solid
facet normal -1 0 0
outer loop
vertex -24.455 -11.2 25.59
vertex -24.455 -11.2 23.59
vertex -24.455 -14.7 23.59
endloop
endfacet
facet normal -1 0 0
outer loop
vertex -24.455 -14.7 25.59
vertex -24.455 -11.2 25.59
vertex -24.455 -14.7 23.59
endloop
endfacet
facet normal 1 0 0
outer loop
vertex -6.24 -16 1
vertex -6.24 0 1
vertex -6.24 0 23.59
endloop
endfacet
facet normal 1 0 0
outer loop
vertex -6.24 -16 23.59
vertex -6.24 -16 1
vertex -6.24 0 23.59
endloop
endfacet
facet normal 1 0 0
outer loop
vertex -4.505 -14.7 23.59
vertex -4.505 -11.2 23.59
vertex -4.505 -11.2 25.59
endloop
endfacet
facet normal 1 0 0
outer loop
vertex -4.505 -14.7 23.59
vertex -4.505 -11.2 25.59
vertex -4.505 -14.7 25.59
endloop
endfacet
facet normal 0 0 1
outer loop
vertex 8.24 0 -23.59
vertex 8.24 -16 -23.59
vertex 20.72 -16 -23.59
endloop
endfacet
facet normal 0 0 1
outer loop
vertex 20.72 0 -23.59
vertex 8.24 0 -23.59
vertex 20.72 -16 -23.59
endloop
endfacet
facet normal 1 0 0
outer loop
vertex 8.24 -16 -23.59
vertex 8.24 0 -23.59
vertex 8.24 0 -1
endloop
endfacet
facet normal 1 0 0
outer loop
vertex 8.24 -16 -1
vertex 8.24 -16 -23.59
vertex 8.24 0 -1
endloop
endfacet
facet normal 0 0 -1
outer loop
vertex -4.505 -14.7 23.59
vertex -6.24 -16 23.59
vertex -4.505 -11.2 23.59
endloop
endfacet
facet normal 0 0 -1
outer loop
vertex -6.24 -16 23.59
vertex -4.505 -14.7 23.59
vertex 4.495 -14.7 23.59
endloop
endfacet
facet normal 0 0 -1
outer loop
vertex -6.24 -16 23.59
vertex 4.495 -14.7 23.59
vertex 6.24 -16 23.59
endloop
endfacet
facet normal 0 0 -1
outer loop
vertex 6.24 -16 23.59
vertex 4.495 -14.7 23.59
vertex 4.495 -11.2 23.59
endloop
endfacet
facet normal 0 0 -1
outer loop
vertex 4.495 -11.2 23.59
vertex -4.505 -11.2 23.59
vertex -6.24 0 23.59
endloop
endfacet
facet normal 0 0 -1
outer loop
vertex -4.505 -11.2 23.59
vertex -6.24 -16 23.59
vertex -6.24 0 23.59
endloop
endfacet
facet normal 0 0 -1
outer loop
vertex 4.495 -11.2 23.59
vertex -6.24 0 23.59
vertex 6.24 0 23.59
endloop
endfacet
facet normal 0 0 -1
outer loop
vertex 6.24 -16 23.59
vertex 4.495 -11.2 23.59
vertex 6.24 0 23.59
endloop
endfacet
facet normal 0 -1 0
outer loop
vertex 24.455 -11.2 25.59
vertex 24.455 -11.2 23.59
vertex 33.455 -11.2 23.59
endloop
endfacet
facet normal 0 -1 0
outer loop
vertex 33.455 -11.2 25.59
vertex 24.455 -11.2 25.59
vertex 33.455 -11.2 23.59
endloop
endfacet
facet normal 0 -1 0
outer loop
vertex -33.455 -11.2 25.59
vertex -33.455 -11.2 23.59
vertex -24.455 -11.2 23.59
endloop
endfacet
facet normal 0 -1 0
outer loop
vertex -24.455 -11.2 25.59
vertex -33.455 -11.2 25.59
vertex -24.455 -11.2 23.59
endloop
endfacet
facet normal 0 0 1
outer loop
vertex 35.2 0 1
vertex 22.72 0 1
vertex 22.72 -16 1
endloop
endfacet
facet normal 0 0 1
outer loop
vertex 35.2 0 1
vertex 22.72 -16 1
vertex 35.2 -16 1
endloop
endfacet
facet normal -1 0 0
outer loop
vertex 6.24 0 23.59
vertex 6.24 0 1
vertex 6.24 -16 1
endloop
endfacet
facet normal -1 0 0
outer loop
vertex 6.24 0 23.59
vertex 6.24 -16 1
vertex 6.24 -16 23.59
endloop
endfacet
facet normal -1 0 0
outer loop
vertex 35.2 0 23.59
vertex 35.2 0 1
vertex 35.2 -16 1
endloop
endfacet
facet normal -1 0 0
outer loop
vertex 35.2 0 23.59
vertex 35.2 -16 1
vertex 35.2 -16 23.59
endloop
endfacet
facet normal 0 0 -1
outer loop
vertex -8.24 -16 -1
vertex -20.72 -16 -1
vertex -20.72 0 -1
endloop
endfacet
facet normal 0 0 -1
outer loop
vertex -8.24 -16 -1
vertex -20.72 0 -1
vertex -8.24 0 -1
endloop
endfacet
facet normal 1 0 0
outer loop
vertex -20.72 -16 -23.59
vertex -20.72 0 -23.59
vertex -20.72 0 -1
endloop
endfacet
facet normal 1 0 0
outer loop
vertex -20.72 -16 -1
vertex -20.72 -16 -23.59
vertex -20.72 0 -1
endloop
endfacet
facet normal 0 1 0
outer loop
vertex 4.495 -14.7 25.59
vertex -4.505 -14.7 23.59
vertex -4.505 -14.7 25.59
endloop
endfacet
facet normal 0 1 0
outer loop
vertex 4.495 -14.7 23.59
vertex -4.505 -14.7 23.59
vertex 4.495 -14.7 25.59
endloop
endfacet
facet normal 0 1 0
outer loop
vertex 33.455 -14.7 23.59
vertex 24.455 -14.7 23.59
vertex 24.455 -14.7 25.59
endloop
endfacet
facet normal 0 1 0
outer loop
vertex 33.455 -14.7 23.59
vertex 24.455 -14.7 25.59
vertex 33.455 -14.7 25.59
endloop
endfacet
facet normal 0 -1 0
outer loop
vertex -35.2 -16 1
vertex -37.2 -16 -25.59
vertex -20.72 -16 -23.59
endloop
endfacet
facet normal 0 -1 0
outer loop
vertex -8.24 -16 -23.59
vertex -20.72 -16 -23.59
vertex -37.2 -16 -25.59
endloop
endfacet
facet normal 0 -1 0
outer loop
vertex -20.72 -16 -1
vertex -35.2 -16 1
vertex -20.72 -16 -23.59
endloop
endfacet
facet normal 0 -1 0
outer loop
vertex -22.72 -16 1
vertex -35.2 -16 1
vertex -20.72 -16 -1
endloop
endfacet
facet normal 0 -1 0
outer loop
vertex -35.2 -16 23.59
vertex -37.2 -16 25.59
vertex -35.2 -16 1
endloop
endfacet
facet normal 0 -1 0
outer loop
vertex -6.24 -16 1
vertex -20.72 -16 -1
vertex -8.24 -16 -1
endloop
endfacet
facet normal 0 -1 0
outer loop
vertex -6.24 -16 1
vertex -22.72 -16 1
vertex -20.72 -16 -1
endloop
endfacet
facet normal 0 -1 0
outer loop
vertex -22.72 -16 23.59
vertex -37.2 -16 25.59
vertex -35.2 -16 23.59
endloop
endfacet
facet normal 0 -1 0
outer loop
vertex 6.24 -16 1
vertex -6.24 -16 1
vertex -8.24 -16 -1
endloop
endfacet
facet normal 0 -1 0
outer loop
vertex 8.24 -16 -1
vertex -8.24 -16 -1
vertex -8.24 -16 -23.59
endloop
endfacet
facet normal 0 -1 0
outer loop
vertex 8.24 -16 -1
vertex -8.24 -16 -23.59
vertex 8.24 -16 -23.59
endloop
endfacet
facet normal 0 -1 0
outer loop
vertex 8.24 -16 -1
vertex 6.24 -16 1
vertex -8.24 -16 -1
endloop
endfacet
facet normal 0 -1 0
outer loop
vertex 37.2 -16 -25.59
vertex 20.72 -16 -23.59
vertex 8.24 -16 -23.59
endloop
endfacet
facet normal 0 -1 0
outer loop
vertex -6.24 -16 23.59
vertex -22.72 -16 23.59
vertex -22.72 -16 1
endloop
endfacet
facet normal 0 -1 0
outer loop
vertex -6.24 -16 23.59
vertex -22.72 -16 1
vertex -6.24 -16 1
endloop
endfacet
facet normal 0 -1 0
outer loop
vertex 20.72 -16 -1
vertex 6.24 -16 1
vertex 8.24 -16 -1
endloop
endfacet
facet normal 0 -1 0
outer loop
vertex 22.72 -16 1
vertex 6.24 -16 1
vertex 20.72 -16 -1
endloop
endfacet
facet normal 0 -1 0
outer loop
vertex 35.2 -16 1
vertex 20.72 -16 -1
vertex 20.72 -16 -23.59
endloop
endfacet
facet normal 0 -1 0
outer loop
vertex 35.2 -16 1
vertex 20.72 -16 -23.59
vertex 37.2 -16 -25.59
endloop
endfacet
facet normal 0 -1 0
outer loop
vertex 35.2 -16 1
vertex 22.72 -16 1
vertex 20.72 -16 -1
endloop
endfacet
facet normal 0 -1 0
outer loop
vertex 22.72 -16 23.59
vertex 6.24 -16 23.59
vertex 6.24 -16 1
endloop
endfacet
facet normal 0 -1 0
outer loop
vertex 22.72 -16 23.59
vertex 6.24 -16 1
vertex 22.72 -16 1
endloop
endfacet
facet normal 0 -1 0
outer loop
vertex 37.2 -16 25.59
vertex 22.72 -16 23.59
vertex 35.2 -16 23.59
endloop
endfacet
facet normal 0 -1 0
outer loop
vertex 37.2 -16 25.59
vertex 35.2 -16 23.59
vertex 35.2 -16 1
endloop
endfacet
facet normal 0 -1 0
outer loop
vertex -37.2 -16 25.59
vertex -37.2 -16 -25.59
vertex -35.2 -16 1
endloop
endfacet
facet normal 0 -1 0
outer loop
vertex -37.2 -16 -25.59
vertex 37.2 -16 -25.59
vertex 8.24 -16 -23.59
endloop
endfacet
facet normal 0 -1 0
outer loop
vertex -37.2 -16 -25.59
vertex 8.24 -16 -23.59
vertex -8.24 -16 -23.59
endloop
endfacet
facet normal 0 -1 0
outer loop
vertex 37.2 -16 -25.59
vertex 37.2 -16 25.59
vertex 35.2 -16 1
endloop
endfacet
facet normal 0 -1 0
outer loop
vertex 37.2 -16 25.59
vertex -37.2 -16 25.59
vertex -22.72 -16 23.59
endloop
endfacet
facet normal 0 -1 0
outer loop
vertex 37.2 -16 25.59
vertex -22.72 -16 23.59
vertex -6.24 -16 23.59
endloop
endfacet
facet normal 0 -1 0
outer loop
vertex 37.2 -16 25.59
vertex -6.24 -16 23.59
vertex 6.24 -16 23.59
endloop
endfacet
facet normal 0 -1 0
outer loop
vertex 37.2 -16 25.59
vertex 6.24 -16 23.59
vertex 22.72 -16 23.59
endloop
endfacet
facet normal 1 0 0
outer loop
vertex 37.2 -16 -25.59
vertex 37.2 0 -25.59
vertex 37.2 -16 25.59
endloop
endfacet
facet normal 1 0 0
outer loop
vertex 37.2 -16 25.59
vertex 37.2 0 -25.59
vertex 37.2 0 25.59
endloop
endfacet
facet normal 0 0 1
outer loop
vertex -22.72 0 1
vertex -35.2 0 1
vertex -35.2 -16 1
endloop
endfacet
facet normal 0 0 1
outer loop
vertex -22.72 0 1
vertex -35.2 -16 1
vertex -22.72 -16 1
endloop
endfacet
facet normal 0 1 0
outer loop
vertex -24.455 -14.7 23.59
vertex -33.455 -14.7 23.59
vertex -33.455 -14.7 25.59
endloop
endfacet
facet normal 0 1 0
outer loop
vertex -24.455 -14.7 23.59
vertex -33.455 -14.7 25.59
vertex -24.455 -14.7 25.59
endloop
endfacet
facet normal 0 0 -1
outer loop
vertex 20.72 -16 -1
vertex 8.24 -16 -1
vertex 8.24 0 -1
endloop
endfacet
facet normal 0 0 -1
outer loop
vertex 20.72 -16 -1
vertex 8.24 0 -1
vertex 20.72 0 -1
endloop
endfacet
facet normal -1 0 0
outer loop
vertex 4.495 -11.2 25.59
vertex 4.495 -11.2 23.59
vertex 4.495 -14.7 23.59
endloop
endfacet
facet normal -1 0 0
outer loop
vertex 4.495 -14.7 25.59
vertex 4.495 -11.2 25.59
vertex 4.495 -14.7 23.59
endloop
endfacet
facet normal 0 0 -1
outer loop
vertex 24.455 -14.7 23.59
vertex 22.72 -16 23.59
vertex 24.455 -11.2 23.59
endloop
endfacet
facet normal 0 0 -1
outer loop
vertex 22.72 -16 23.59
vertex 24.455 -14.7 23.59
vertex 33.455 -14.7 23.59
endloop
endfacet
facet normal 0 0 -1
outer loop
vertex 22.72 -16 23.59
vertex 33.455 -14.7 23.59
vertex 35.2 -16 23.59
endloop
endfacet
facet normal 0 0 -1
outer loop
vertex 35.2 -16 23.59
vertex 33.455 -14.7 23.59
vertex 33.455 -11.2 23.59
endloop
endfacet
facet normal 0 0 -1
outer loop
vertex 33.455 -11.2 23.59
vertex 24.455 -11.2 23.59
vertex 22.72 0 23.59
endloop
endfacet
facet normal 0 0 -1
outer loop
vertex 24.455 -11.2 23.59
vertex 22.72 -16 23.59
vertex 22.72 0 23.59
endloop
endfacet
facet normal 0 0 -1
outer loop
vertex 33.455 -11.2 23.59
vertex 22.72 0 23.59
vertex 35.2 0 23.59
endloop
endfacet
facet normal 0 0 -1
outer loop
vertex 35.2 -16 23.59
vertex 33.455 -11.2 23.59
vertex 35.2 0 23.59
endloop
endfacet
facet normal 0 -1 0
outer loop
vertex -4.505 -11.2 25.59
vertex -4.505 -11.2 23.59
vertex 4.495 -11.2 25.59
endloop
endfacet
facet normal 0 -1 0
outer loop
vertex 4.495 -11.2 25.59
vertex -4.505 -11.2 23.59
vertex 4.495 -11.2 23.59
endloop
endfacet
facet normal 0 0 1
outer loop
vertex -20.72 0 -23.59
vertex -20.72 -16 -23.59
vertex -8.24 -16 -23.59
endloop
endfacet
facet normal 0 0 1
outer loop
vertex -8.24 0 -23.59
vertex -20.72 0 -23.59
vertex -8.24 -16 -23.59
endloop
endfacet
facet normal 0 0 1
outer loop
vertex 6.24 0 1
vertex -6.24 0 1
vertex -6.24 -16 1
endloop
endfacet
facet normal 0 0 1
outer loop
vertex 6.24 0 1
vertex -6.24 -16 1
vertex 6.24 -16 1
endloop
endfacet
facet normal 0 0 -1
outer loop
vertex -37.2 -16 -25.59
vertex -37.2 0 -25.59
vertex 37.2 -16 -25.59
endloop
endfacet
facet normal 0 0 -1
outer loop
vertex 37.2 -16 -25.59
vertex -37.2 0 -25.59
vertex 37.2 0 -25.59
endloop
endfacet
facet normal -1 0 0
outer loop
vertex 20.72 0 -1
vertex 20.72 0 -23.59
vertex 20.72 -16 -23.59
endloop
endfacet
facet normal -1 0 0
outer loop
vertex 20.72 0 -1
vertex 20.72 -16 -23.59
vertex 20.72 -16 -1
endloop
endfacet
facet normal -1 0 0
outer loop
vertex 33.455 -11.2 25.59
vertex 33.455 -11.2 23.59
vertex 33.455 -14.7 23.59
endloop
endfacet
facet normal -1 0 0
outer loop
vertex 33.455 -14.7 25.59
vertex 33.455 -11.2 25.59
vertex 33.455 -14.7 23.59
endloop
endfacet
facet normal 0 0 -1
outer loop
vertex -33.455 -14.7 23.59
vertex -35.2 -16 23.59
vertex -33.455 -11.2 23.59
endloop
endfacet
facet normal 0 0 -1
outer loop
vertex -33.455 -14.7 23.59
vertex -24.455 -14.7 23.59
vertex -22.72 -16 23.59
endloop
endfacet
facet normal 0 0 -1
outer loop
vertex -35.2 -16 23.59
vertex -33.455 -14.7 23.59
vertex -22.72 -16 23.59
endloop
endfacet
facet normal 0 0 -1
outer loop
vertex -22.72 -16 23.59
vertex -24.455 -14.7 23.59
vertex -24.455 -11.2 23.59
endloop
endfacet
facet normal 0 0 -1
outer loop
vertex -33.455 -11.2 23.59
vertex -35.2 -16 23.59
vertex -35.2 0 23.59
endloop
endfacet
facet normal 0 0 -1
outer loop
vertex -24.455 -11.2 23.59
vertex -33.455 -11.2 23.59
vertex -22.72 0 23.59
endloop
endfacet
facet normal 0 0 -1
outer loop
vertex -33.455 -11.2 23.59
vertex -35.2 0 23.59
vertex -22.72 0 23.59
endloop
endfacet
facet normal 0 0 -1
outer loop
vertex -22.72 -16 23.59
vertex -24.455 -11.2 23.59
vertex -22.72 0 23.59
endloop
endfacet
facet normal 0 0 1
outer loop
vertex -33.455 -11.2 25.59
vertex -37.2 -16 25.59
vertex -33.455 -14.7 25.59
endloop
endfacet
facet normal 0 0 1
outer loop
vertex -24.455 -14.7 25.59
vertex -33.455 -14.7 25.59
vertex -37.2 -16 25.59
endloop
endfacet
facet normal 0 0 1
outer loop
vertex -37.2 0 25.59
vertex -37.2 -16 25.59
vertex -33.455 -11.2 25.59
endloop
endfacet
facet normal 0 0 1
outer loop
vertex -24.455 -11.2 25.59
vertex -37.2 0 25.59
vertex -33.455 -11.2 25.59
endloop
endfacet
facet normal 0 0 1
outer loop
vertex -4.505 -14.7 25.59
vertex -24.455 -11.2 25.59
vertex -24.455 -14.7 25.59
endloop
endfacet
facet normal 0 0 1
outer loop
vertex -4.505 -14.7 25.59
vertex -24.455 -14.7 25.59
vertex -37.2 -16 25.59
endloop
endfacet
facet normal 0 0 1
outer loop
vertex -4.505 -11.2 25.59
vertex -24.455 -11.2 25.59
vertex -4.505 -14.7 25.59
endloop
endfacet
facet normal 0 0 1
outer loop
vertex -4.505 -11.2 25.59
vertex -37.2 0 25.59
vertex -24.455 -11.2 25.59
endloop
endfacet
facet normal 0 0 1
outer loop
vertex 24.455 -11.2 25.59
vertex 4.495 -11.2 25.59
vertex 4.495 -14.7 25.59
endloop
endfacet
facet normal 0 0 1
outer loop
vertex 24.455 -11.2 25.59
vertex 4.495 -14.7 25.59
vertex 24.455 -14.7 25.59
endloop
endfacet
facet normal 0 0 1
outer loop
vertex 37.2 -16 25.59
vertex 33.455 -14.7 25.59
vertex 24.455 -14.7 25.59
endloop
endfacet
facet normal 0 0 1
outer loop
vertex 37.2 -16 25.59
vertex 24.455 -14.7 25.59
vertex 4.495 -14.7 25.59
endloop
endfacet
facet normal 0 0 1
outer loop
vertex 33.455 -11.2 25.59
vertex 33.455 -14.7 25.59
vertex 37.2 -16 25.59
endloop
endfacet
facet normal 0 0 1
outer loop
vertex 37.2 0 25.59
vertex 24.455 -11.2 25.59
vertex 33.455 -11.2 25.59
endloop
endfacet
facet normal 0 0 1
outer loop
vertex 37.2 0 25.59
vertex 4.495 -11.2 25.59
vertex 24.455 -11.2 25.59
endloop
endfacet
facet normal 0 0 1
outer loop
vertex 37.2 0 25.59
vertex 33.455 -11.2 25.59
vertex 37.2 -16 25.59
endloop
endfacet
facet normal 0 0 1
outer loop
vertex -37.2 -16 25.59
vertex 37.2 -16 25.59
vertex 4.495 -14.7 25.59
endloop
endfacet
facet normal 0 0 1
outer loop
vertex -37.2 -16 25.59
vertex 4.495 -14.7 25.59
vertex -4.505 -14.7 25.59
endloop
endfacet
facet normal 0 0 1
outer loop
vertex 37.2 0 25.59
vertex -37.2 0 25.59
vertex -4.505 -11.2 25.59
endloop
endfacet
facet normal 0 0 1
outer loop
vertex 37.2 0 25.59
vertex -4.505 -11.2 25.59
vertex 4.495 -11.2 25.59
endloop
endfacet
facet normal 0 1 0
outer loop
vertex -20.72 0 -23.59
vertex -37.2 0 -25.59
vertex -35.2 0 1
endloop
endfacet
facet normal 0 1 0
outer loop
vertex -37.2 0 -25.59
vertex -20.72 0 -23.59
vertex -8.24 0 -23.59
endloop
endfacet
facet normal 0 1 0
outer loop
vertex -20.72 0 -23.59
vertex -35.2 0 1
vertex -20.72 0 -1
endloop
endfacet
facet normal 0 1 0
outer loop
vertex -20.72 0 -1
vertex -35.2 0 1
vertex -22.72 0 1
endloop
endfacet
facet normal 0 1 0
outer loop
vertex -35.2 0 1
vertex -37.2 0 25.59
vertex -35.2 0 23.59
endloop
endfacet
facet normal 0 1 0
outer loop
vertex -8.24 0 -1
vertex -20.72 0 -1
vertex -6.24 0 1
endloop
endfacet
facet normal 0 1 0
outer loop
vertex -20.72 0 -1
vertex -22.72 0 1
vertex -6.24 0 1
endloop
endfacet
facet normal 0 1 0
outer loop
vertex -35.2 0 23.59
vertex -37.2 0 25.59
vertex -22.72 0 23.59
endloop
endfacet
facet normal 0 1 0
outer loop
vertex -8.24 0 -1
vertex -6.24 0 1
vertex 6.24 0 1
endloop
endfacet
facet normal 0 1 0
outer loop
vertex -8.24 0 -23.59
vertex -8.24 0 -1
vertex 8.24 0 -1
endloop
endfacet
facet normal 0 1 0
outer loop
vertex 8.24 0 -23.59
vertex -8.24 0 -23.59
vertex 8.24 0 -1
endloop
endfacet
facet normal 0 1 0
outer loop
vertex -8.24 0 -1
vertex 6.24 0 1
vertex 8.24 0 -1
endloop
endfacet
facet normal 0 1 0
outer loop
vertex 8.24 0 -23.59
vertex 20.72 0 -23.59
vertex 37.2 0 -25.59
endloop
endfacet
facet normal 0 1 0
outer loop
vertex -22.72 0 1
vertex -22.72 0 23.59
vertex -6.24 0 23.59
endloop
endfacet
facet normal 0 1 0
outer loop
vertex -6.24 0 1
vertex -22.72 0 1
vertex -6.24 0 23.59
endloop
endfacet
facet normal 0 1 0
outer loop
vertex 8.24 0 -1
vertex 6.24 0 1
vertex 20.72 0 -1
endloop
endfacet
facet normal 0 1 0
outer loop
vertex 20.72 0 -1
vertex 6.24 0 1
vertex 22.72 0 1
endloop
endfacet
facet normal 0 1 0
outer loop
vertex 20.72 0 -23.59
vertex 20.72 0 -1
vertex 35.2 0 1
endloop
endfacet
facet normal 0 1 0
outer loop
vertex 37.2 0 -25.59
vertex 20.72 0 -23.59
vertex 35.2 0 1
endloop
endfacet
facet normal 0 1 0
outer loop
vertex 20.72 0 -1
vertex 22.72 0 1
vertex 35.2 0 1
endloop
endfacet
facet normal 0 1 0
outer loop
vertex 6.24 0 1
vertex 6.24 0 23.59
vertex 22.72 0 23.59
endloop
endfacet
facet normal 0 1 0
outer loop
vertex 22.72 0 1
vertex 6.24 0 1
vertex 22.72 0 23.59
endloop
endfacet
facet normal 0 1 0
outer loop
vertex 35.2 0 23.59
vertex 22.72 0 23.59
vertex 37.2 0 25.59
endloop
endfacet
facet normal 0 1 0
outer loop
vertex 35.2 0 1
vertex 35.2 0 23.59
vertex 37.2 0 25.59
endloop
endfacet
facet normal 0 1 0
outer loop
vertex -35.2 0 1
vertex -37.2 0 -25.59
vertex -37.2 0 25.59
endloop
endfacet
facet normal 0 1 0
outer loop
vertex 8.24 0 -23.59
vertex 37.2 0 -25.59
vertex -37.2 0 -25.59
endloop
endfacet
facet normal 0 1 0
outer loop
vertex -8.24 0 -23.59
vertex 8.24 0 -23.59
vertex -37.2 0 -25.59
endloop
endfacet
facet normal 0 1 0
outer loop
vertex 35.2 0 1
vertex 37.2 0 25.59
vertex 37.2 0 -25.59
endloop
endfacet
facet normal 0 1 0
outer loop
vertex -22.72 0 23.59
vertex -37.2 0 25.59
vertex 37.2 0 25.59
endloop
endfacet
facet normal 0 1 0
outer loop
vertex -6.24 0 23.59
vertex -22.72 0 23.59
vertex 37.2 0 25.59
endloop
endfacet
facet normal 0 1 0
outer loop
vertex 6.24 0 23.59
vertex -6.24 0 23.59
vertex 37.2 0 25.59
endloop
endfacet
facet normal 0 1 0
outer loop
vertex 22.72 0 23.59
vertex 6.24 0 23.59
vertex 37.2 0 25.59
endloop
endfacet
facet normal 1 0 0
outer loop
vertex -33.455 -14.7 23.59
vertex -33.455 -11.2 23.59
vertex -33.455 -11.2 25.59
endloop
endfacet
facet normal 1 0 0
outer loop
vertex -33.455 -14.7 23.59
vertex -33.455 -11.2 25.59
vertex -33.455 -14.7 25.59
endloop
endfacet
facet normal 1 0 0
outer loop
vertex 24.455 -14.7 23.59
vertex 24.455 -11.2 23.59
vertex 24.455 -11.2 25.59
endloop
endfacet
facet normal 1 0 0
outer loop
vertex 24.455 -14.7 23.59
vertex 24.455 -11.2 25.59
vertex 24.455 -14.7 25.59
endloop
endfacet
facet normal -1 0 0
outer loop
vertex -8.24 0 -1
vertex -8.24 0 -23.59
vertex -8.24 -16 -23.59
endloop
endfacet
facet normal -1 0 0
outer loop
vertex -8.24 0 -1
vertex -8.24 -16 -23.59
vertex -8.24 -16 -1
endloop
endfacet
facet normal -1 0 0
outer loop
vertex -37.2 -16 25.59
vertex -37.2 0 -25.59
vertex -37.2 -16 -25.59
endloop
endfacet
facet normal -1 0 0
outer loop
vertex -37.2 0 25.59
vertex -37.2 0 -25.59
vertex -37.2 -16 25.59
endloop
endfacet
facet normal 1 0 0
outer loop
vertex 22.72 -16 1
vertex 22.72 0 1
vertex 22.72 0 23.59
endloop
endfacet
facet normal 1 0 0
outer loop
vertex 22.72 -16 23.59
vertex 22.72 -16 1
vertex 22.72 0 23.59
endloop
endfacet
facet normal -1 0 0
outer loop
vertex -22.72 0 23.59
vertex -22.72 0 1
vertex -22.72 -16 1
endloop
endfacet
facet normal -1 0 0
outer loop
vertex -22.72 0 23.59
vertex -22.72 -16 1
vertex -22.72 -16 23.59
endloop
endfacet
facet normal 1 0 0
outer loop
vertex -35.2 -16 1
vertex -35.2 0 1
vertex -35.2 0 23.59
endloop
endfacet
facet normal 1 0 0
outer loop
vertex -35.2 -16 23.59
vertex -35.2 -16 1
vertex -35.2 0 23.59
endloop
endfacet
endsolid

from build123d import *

# Parameters (mm, degrees)
F0_W     = 74.4
F0_H     = 51.18
F0_W_2   = 12.48
F0_H_2   = 22.59
F1_DEPTH = 16
F2_W     = 9
F2_H     = 3.5
F3_DEPTH = 25


with BuildPart() as f1:
    # F0 (on Front) → F1 (new body)
    with BuildSketch(Plane.XZ):
        Rectangle(F0_W, F0_H)
        with Locations((-14.48, -12.295)):
            Rectangle(F0_W_2, F0_H_2, mode=Mode.SUBTRACT)
        with Locations((14.48, -12.295)):
            Rectangle(F0_W_2, F0_H_2, mode=Mode.SUBTRACT)
        with Locations((-28.96, 12.295)):
            Rectangle(F0_W_2, F0_H_2, mode=Mode.SUBTRACT)
        with Locations((0, 12.295)):
            Rectangle(F0_W_2, F0_H_2, mode=Mode.SUBTRACT)
        with Locations((28.96, 12.295)):
            Rectangle(F0_W_2, F0_H_2, mode=Mode.SUBTRACT)
    extrude(amount=F1_DEPTH)

    # F2 (on face) → F3 (cut)
    with BuildSketch(Plane(origin=(0, 0, 23.59), x_dir=(1, 0, 0), z_dir=(0, 0, -1))):
        with Locations((-0.005, 12.95)):
            Rectangle(F2_W, F2_H)
        with Locations((-28.955, 12.95)):
            Rectangle(F2_W, F2_H)
        with Locations((28.955, 12.95)):
            Rectangle(F2_W, F2_H)
    extrude(amount=-F3_DEPTH, mode=Mode.SUBTRACT)


solid = f1.part
